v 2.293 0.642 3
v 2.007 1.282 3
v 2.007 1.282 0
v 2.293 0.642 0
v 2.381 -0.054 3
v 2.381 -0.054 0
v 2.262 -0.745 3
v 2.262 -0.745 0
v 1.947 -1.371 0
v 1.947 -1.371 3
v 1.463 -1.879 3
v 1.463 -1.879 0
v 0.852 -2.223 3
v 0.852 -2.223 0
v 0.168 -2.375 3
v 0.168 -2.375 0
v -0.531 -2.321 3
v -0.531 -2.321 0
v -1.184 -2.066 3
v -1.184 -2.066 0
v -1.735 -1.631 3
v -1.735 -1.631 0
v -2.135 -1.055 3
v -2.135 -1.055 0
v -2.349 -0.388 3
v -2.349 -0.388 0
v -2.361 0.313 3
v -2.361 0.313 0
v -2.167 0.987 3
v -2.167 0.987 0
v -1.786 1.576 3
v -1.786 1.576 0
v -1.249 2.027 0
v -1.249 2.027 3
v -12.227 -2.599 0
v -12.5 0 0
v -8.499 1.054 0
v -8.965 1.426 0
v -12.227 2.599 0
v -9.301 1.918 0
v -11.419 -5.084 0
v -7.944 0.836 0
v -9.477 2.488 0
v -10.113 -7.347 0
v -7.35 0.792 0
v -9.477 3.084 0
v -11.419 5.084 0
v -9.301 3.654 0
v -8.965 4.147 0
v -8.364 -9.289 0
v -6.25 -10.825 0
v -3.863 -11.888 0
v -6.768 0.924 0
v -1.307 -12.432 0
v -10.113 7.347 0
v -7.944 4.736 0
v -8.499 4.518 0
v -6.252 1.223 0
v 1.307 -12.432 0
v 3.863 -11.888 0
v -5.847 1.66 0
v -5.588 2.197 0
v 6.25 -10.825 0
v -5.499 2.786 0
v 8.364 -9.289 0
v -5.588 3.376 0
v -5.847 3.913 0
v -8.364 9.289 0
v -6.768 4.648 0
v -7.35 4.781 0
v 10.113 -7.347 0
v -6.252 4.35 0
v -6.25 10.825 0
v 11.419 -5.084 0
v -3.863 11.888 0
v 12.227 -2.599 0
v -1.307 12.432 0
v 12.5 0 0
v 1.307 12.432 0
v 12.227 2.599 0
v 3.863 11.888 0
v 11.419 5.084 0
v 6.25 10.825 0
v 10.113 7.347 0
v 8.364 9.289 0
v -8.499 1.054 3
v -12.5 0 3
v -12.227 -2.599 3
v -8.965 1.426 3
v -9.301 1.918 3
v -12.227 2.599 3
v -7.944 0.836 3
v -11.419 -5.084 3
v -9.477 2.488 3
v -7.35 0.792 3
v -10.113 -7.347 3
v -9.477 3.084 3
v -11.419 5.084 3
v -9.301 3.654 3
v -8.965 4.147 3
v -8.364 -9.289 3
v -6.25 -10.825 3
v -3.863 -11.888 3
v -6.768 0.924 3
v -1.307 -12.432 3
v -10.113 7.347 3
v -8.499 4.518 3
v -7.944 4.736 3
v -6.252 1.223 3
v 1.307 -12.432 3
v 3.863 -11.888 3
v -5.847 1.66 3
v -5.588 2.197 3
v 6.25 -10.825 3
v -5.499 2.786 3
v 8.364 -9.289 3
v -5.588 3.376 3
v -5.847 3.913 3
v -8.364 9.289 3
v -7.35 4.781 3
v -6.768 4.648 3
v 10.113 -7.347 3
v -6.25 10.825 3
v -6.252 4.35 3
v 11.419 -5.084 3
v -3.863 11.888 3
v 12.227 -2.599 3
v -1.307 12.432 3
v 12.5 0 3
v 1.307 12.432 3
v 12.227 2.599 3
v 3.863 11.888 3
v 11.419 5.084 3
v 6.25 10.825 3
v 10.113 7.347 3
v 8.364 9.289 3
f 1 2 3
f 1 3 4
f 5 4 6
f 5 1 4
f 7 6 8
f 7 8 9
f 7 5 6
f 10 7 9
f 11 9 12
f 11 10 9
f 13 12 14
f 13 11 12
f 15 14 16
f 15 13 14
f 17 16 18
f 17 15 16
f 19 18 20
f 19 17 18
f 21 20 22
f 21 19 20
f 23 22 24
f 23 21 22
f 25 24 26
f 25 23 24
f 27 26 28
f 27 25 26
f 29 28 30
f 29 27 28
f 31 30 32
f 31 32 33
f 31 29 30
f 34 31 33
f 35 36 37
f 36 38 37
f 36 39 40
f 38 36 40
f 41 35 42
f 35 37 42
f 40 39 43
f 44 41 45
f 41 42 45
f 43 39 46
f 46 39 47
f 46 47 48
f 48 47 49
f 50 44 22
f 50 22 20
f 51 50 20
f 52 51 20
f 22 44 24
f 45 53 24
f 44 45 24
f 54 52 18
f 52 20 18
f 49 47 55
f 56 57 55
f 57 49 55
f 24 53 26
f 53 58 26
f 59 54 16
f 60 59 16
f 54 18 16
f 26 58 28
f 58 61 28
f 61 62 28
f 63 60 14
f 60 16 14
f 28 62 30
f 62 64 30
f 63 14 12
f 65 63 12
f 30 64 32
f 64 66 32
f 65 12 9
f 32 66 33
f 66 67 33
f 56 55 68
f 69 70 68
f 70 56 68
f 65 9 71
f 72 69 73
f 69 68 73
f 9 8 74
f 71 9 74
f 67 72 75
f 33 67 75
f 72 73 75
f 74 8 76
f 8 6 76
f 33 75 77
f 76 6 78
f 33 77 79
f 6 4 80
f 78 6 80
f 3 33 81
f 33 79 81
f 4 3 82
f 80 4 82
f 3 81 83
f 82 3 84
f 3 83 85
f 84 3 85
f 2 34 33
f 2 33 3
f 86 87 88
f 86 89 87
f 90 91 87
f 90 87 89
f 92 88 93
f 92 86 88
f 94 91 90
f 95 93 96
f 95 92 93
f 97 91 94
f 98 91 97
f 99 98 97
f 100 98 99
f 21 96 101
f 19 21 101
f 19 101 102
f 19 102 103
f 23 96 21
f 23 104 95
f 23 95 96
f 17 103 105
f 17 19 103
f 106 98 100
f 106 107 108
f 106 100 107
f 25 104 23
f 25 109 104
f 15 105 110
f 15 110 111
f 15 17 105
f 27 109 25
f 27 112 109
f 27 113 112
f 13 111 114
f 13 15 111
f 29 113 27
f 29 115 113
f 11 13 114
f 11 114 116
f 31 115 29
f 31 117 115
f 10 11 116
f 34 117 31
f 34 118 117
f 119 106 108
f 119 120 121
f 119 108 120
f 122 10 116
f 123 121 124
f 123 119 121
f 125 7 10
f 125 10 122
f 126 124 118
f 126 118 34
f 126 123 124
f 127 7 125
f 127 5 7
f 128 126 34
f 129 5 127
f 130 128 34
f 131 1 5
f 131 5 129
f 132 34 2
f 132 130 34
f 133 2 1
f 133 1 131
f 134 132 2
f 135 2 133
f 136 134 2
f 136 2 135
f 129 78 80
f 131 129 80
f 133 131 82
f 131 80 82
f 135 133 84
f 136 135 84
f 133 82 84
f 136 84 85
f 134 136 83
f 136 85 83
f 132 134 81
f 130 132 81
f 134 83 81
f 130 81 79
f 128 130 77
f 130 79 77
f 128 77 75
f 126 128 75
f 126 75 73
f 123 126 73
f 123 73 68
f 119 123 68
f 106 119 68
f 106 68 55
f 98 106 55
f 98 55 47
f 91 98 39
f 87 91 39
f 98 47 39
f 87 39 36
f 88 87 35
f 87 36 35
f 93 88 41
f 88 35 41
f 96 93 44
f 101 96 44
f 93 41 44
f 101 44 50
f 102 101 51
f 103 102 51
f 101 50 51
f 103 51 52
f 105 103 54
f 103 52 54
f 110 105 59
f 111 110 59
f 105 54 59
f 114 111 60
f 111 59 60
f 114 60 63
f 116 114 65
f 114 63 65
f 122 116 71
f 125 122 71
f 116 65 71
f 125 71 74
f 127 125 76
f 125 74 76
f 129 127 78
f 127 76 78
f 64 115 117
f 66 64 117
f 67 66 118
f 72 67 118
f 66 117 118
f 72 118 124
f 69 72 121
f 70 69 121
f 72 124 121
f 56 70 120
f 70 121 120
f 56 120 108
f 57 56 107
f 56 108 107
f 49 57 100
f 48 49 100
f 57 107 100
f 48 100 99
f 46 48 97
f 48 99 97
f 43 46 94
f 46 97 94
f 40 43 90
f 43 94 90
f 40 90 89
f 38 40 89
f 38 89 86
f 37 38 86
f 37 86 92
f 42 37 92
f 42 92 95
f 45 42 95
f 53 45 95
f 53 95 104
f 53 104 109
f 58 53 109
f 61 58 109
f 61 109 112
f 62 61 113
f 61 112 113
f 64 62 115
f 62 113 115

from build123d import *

# Parameters (mm, degrees)
SKETCH1_R           = 12.5
BOSS_EXTRUDE1_DEPTH = 3
CUT_EXTRUDE1_DEPTH  = 3
SKETCH3_R           = 2
CUT_EXTRUDE2_DEPTH  = 3


with BuildPart() as part:
    # Sketch1 → Boss-Extrude1 (new body)
    with BuildSketch(Plane.XY):
        Circle(SKETCH1_R)
    extrude(amount=BOSS_EXTRUDE1_DEPTH)

    # Sketch2 → Cut-Extrude1 (cut)
    with BuildSketch(Plane.XY.offset(3)):
        with BuildLine():
            Line((-1.249238699, 2.027252879), (2.006668261, 1.282042922))
            ThreePointArc((2.006668261, 1.282042922), (-0.531280863, -2.321226445), (-1.249238699, 2.027252879))
        make_face()
    extrude(amount=-CUT_EXTRUDE1_DEPTH, mode=Mode.SUBTRACT)

    # Sketch3 → Cut-Extrude2 (cut)
    with BuildSketch(Plane.XY.offset(3)):
        with Locations((-7.499150429, 2.786169925)):
            Circle(SKETCH3_R)
    extrude(amount=-CUT_EXTRUDE2_DEPTH, mode=Mode.SUBTRACT)


solid = part.part
